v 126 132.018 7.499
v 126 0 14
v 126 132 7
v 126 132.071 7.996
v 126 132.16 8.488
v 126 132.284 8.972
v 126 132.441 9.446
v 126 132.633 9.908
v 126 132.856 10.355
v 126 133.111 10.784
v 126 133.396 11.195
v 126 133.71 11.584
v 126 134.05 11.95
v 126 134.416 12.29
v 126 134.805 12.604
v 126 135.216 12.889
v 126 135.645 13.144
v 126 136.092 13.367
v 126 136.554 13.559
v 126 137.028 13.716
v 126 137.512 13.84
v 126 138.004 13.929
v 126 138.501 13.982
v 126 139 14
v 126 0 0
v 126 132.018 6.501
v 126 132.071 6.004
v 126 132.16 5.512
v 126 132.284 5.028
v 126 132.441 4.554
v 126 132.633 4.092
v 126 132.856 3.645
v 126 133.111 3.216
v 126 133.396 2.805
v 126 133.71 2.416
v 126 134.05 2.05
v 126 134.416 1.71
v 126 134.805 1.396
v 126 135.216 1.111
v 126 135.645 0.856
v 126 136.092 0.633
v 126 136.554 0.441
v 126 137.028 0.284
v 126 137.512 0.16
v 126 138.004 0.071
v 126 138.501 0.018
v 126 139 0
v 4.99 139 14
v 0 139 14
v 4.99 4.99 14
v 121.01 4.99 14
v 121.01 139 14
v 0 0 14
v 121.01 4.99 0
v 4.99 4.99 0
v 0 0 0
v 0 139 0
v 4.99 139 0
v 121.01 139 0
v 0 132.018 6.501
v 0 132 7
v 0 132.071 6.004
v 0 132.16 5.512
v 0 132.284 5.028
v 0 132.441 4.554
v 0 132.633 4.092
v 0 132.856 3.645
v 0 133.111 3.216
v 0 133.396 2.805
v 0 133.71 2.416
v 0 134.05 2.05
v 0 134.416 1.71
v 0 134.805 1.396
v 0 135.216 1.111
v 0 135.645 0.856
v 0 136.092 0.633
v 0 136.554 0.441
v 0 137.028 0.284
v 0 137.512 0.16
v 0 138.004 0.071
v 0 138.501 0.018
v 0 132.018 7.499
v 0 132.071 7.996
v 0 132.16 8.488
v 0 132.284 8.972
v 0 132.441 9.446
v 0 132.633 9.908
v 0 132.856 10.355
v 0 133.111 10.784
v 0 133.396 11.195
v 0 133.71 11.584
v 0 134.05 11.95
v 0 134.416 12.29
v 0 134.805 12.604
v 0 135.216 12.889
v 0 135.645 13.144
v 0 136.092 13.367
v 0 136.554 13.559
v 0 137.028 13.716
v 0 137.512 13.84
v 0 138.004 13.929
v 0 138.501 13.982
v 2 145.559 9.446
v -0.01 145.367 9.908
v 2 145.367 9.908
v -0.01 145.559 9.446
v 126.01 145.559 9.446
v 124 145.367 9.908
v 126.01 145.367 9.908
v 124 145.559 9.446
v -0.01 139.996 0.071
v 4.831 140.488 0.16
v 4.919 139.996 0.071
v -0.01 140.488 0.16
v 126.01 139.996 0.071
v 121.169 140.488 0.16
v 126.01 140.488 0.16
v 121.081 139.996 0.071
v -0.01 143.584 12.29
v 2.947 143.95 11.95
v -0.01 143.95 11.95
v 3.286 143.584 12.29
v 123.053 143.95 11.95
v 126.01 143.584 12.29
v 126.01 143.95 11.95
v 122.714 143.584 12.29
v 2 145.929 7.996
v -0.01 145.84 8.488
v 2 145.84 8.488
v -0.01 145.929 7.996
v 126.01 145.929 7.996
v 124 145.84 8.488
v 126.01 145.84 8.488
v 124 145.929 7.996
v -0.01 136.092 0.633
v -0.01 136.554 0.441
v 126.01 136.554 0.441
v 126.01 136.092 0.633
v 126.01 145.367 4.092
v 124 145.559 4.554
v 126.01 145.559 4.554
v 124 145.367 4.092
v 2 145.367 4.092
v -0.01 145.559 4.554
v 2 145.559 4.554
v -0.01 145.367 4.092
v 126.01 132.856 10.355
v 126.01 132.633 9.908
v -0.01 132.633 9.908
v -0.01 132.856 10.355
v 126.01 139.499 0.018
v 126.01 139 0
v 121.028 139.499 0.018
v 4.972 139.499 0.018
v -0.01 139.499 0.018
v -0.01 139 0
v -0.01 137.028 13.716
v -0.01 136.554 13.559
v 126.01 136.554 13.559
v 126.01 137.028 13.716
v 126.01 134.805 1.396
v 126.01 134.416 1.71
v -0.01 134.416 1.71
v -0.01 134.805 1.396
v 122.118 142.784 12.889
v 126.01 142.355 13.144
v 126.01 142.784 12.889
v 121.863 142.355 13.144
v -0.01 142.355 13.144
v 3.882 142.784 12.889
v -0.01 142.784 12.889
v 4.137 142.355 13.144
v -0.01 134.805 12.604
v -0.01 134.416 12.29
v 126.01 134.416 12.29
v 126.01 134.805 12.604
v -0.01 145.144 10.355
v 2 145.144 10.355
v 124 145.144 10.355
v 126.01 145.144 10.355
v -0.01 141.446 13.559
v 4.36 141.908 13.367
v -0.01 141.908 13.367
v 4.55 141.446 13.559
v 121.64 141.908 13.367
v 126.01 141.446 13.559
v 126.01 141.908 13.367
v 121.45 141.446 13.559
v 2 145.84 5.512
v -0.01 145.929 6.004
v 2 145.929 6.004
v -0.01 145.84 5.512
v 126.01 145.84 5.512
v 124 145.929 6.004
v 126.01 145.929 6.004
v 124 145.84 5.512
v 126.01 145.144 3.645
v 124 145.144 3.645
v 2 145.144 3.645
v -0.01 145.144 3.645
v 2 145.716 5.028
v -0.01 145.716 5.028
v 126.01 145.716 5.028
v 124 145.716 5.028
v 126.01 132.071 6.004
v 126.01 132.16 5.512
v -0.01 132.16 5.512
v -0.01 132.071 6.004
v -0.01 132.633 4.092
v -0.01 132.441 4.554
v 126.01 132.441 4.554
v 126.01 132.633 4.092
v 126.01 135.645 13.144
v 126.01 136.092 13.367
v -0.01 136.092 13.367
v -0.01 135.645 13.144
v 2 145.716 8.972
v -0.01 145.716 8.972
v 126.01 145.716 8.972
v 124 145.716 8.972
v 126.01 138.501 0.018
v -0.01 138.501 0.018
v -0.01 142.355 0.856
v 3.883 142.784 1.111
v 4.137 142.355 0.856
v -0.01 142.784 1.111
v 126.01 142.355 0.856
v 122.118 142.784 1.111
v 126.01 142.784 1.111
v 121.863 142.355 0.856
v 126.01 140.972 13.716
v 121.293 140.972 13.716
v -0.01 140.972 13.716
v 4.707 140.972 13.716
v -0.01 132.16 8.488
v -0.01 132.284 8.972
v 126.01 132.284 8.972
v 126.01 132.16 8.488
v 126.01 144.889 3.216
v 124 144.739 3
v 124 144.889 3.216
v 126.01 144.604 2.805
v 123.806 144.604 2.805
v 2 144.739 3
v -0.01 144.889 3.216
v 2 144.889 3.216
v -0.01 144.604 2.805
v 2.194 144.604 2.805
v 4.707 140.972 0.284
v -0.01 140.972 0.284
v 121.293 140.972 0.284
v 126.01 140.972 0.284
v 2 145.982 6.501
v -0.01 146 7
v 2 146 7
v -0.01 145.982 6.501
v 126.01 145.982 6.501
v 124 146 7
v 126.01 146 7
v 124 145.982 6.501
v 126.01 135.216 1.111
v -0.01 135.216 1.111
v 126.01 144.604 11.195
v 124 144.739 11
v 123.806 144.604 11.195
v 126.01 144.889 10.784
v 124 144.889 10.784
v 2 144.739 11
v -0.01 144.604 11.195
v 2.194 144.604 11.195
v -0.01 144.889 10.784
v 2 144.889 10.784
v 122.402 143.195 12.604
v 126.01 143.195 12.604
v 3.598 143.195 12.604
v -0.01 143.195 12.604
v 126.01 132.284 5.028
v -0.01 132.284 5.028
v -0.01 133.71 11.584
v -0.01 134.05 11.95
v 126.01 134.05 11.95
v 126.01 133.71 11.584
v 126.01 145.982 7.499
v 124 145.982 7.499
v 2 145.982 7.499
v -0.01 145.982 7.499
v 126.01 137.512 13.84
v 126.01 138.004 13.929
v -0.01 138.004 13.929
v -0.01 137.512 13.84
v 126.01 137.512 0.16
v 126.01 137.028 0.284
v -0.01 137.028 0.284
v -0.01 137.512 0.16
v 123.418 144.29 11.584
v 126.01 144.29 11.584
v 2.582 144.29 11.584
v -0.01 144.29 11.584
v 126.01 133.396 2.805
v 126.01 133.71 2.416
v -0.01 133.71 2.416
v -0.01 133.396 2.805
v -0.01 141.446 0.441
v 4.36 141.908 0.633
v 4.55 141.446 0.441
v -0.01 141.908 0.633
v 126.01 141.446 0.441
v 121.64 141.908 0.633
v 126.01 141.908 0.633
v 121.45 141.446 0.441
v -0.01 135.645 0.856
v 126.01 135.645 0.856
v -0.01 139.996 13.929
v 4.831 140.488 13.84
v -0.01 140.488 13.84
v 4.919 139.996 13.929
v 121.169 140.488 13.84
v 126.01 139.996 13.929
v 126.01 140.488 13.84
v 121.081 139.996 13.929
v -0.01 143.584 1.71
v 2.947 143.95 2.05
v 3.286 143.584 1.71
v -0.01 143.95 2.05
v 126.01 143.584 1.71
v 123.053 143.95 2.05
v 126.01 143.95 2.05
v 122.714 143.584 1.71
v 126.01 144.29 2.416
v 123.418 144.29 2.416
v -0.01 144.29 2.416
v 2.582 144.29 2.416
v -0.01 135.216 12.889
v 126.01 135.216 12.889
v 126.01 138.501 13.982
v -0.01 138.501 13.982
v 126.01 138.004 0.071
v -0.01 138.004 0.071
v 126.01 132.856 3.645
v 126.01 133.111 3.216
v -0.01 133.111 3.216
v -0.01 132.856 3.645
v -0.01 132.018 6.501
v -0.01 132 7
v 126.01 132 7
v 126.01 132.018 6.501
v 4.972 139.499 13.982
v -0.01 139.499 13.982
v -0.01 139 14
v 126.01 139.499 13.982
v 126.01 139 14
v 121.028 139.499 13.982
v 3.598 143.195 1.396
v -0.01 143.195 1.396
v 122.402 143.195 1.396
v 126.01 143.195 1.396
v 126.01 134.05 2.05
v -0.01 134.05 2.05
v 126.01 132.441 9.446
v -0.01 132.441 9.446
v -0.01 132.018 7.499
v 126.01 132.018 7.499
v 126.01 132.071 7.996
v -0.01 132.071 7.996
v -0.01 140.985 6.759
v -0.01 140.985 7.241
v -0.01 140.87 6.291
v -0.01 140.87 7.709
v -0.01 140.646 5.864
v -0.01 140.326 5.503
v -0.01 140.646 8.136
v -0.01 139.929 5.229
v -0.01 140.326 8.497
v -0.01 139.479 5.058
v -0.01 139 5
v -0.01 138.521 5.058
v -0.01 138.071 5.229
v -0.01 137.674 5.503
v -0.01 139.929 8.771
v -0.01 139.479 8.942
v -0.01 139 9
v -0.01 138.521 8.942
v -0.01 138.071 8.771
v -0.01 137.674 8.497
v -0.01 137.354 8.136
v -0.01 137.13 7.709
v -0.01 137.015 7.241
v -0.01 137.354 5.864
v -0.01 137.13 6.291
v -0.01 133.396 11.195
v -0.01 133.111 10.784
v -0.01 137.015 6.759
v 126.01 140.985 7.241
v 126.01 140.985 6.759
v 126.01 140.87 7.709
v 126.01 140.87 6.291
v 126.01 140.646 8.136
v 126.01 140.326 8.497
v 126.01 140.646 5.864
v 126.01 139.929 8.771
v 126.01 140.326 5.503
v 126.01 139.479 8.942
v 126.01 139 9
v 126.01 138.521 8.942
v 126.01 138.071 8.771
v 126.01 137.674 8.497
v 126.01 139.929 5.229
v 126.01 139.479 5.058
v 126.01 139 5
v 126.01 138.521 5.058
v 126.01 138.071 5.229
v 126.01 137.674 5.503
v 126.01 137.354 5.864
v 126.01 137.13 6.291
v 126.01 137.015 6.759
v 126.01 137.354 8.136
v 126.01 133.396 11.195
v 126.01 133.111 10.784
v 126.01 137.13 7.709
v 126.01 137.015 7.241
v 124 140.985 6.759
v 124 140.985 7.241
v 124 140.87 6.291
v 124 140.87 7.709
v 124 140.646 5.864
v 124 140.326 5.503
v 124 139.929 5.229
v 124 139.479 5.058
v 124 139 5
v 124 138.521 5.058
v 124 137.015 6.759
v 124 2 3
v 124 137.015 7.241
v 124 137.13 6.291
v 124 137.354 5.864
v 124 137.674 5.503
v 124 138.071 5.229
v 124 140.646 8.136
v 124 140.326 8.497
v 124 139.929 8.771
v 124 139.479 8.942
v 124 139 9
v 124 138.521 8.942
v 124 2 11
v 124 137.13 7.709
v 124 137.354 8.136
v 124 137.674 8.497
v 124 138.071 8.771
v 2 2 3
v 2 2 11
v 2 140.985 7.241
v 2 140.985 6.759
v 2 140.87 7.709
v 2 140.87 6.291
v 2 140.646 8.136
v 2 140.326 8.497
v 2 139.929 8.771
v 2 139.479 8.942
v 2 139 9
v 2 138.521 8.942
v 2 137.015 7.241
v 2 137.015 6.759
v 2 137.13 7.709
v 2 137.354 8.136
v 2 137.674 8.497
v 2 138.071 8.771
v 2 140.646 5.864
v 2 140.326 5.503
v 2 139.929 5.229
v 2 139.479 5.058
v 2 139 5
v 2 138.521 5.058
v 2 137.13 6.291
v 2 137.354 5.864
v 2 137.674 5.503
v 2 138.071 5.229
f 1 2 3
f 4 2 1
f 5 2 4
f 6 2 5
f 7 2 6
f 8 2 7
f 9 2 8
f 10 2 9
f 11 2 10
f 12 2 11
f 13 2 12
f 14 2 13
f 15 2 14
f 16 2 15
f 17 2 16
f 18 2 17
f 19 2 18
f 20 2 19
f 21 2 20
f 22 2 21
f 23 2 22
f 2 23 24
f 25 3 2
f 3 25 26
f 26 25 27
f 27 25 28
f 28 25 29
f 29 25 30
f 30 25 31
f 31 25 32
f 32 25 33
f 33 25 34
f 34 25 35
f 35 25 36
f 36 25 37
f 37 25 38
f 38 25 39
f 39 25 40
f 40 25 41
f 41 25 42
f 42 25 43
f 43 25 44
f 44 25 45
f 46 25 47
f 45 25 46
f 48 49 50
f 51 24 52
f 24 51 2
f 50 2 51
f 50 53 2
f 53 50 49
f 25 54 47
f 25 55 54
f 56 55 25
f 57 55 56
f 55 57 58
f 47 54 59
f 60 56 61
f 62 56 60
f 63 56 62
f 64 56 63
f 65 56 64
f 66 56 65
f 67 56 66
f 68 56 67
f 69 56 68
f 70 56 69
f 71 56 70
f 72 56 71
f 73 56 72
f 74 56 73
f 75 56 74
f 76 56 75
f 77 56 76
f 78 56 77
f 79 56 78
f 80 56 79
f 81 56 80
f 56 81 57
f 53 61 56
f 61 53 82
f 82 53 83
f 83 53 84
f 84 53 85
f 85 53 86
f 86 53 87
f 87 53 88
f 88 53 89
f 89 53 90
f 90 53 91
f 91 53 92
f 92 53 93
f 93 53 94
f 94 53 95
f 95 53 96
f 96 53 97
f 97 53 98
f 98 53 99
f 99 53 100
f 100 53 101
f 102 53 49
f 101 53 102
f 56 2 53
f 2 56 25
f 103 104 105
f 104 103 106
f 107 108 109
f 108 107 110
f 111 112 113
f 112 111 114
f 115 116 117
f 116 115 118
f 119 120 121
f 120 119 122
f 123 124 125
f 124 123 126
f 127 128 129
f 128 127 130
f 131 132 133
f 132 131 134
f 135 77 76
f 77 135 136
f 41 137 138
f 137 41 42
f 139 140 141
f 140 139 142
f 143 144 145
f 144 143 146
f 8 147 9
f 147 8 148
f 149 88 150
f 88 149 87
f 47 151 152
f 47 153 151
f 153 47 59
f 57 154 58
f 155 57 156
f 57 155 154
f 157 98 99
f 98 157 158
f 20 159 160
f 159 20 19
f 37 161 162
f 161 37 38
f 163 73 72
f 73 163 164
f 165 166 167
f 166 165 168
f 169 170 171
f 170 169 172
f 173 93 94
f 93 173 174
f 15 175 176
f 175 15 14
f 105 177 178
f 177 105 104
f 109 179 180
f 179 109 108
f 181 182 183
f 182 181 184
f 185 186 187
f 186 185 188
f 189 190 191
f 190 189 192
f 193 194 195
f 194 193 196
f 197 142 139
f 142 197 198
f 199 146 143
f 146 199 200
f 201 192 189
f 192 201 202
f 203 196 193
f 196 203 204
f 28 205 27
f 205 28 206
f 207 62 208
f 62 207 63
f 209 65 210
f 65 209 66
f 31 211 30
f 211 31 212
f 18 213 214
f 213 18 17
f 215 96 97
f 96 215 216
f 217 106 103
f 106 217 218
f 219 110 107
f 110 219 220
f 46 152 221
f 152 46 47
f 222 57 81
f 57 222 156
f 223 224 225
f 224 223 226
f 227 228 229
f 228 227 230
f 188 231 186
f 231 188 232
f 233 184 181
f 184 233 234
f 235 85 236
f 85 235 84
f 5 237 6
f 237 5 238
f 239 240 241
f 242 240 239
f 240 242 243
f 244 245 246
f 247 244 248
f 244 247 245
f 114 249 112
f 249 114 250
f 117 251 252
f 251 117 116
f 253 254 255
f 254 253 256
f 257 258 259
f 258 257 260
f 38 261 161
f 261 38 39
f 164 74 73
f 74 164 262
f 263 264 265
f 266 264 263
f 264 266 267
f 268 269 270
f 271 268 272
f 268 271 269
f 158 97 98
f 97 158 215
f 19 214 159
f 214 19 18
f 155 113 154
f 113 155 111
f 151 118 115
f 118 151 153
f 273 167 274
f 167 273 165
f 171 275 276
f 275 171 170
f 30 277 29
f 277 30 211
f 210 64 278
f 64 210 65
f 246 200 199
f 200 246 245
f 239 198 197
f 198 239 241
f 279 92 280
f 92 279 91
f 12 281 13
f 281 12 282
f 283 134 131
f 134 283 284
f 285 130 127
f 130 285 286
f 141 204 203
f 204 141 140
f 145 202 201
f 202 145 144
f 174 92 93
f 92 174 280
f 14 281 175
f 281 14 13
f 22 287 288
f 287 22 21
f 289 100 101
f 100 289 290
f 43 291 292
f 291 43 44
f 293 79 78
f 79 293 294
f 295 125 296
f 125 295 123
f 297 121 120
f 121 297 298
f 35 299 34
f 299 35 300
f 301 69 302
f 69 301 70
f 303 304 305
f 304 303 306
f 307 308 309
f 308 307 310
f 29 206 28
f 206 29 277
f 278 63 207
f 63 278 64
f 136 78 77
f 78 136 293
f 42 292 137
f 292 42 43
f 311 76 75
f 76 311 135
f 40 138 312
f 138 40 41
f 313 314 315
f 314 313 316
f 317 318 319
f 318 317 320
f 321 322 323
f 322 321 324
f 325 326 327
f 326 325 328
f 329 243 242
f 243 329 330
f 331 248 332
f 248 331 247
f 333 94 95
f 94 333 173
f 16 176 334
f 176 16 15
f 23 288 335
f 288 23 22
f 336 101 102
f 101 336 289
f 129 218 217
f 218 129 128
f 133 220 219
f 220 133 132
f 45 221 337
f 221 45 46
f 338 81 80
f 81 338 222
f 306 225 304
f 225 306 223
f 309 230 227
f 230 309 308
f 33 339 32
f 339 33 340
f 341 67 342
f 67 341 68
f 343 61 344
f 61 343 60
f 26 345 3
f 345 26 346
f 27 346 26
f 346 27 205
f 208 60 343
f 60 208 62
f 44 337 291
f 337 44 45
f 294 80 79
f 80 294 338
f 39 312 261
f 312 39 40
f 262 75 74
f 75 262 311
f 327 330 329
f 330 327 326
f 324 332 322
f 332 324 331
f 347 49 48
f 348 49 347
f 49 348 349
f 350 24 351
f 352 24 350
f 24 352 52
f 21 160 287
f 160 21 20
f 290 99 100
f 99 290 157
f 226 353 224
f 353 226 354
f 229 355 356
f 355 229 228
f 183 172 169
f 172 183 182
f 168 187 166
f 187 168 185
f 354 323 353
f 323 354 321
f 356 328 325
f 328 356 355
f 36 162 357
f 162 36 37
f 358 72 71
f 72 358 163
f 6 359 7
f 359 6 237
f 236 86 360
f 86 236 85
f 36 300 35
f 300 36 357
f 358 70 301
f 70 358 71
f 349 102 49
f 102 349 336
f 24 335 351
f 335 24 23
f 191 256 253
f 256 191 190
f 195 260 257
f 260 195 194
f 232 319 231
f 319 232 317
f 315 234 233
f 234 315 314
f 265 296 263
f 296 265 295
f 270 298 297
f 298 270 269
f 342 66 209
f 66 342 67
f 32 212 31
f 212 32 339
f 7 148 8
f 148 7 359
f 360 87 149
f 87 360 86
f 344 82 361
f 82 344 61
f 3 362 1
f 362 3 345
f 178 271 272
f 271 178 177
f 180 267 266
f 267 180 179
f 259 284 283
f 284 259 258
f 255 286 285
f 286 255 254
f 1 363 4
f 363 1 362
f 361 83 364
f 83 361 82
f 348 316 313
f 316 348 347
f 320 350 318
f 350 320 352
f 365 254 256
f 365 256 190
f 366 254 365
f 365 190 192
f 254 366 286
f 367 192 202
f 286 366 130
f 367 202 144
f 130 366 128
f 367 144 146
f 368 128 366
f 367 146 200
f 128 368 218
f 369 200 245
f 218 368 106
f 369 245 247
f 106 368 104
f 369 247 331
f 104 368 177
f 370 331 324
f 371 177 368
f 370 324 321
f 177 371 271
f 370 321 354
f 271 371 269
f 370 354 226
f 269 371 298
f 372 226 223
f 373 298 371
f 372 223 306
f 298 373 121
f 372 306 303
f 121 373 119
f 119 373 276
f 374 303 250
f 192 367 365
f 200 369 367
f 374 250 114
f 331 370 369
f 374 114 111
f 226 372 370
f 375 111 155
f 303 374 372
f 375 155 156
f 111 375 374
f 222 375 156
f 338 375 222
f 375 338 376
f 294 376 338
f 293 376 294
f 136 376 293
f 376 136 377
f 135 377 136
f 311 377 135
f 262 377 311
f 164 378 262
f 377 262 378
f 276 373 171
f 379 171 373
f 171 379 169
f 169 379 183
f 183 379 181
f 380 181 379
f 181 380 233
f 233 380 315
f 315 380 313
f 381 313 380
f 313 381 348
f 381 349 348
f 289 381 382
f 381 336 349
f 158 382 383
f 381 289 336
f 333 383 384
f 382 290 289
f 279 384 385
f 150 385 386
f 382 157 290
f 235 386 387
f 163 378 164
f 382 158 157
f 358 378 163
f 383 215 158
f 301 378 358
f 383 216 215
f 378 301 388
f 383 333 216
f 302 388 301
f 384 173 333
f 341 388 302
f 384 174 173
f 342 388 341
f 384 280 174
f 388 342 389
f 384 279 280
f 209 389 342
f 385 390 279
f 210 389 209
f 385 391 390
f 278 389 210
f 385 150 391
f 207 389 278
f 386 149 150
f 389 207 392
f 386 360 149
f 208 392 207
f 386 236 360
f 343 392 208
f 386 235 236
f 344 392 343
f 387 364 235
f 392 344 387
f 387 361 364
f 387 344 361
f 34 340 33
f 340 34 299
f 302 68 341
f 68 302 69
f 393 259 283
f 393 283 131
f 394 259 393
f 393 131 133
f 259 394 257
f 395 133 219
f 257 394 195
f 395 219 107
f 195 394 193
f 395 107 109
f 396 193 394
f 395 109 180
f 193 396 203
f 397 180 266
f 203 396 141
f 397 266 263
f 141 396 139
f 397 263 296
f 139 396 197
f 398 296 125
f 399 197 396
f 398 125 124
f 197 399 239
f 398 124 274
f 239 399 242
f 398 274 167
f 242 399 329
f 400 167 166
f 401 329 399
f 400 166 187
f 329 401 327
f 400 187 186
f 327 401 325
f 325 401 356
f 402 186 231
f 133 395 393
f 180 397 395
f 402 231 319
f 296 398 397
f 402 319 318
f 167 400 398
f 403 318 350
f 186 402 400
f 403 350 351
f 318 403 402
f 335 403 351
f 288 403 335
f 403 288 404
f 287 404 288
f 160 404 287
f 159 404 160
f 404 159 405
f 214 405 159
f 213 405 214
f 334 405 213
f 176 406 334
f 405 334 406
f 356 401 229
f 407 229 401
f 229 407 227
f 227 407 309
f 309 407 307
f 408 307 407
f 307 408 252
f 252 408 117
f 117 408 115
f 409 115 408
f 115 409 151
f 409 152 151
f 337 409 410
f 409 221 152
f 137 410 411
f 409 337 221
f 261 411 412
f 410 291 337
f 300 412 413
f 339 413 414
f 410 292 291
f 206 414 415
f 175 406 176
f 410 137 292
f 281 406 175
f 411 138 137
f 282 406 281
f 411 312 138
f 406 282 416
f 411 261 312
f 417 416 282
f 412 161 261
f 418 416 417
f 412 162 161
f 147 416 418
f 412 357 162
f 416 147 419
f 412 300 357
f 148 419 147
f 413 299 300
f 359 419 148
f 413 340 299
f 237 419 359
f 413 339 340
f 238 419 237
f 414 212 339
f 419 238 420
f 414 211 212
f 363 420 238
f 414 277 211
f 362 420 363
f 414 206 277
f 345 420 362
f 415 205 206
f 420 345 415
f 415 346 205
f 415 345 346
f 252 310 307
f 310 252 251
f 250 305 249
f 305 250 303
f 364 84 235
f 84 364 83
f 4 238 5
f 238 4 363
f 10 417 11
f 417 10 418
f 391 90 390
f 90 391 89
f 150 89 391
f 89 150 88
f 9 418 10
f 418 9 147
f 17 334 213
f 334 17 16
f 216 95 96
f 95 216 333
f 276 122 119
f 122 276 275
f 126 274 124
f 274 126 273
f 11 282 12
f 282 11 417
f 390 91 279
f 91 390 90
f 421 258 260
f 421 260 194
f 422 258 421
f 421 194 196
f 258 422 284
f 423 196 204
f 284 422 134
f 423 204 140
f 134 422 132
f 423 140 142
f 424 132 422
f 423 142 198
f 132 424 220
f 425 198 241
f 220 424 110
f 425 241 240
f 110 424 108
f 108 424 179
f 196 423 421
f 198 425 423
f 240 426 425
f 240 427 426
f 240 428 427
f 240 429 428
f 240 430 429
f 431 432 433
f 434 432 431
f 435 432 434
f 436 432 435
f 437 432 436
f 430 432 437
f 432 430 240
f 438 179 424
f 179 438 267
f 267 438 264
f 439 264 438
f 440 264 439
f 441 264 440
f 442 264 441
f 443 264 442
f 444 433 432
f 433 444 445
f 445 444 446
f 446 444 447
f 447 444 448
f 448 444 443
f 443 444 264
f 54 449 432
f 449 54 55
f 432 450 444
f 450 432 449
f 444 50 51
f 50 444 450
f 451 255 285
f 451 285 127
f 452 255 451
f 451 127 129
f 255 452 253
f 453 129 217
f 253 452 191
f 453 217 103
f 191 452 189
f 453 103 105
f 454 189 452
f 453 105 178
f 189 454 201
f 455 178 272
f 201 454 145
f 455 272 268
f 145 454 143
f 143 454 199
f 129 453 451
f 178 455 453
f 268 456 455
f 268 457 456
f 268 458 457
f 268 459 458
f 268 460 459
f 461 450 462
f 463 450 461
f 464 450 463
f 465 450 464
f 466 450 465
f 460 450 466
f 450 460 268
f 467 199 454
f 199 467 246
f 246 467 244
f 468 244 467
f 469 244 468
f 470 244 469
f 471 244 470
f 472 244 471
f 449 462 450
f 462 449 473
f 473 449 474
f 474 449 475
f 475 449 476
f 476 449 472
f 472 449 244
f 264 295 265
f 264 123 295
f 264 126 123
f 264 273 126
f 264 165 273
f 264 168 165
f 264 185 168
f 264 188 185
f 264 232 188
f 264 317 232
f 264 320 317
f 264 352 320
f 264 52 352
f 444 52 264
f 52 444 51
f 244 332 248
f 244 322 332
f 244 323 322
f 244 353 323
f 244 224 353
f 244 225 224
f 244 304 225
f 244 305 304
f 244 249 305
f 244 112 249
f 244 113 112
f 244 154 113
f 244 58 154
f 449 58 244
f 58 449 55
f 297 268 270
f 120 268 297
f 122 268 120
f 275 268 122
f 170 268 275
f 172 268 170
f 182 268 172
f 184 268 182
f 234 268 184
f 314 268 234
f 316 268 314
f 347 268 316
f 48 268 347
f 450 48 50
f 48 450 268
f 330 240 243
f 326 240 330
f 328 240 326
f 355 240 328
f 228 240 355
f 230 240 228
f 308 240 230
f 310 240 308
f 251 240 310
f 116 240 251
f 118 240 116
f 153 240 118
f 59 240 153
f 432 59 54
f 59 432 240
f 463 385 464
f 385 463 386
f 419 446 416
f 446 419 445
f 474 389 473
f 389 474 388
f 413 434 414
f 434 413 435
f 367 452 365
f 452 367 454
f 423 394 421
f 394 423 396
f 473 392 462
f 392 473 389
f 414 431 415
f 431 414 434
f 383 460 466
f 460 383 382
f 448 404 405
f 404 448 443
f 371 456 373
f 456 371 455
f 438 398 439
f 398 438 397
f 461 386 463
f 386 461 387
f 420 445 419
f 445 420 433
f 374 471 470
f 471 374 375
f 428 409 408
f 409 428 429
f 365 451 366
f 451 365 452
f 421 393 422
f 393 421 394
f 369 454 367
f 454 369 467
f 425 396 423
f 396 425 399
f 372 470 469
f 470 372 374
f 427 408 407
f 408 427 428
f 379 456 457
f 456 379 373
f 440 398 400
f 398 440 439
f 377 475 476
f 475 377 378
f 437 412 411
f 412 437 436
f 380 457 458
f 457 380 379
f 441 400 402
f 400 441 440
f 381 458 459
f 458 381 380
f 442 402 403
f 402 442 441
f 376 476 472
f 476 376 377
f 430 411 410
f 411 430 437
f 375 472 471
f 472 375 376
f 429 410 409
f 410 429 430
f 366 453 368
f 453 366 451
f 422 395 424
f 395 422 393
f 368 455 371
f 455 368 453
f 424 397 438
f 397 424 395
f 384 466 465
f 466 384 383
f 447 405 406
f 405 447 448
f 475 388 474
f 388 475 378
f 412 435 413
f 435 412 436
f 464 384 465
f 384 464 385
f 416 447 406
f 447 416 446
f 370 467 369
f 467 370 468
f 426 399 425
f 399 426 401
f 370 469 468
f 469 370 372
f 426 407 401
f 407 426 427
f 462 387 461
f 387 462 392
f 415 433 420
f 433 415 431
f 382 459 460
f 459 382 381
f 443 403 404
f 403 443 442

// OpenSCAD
$fa=1/1;
$fs=1/2;
bissl=1/100;
thickness=8;
width=122;
height=79+60;
lip=3;
wall=2;
d=4;
part="frame"; //[frame,hinge]
if (part=="frame") difference() {
  union() {
    cube([width+2*wall,height,thickness+2*lip]);
    translate([-bissl,height,thickness/2+lip])rotate([0,90,0])cylinder(d=thickness+2*lip,h=width+2*wall+2*bissl);
  }
  hull() {
    translate([wall,wall,lip])cube([width,height+thickness/2+lip,thickness]);
    translate([wall+lip,wall+lip,-bissl])cube([width-2*lip,height+thickness/2+lip,thickness+2*lip+2*bissl]);
  }
  translate([-2*bissl,height,thickness/2+lip])rotate([0,90,0])cylinder(d=d,h=width+2*wall+4*bissl);
}
if (part=="hinge") {
  for (m=[[0,0,0],[1,0,0]]) mirror(m) difference() 
  {
  union()
  {
    translate([width/2+wall,0,0]) rotate([0,90,0])cylinder(d=thickness+2*lip,h=wall);
    translate([width/2+wall,-thickness/2-lip,-thickness-2*lip]) cube([wall,thickness+2*lip,thickness+2*lip]);
    translate([0,-thickness/2-lip,-thickness-2*lip]) cube([width/2+wall,thickness+2*lip,wall]);
  }
  translate([width/3,0,0])cylinder(d=d,2*thickness+5*lip,center=true);
  translate([width/2+wall-bissl,0,0]) rotate([0,90,0])cylinder(d=d,h=wall+2*bissl);
  }
}
